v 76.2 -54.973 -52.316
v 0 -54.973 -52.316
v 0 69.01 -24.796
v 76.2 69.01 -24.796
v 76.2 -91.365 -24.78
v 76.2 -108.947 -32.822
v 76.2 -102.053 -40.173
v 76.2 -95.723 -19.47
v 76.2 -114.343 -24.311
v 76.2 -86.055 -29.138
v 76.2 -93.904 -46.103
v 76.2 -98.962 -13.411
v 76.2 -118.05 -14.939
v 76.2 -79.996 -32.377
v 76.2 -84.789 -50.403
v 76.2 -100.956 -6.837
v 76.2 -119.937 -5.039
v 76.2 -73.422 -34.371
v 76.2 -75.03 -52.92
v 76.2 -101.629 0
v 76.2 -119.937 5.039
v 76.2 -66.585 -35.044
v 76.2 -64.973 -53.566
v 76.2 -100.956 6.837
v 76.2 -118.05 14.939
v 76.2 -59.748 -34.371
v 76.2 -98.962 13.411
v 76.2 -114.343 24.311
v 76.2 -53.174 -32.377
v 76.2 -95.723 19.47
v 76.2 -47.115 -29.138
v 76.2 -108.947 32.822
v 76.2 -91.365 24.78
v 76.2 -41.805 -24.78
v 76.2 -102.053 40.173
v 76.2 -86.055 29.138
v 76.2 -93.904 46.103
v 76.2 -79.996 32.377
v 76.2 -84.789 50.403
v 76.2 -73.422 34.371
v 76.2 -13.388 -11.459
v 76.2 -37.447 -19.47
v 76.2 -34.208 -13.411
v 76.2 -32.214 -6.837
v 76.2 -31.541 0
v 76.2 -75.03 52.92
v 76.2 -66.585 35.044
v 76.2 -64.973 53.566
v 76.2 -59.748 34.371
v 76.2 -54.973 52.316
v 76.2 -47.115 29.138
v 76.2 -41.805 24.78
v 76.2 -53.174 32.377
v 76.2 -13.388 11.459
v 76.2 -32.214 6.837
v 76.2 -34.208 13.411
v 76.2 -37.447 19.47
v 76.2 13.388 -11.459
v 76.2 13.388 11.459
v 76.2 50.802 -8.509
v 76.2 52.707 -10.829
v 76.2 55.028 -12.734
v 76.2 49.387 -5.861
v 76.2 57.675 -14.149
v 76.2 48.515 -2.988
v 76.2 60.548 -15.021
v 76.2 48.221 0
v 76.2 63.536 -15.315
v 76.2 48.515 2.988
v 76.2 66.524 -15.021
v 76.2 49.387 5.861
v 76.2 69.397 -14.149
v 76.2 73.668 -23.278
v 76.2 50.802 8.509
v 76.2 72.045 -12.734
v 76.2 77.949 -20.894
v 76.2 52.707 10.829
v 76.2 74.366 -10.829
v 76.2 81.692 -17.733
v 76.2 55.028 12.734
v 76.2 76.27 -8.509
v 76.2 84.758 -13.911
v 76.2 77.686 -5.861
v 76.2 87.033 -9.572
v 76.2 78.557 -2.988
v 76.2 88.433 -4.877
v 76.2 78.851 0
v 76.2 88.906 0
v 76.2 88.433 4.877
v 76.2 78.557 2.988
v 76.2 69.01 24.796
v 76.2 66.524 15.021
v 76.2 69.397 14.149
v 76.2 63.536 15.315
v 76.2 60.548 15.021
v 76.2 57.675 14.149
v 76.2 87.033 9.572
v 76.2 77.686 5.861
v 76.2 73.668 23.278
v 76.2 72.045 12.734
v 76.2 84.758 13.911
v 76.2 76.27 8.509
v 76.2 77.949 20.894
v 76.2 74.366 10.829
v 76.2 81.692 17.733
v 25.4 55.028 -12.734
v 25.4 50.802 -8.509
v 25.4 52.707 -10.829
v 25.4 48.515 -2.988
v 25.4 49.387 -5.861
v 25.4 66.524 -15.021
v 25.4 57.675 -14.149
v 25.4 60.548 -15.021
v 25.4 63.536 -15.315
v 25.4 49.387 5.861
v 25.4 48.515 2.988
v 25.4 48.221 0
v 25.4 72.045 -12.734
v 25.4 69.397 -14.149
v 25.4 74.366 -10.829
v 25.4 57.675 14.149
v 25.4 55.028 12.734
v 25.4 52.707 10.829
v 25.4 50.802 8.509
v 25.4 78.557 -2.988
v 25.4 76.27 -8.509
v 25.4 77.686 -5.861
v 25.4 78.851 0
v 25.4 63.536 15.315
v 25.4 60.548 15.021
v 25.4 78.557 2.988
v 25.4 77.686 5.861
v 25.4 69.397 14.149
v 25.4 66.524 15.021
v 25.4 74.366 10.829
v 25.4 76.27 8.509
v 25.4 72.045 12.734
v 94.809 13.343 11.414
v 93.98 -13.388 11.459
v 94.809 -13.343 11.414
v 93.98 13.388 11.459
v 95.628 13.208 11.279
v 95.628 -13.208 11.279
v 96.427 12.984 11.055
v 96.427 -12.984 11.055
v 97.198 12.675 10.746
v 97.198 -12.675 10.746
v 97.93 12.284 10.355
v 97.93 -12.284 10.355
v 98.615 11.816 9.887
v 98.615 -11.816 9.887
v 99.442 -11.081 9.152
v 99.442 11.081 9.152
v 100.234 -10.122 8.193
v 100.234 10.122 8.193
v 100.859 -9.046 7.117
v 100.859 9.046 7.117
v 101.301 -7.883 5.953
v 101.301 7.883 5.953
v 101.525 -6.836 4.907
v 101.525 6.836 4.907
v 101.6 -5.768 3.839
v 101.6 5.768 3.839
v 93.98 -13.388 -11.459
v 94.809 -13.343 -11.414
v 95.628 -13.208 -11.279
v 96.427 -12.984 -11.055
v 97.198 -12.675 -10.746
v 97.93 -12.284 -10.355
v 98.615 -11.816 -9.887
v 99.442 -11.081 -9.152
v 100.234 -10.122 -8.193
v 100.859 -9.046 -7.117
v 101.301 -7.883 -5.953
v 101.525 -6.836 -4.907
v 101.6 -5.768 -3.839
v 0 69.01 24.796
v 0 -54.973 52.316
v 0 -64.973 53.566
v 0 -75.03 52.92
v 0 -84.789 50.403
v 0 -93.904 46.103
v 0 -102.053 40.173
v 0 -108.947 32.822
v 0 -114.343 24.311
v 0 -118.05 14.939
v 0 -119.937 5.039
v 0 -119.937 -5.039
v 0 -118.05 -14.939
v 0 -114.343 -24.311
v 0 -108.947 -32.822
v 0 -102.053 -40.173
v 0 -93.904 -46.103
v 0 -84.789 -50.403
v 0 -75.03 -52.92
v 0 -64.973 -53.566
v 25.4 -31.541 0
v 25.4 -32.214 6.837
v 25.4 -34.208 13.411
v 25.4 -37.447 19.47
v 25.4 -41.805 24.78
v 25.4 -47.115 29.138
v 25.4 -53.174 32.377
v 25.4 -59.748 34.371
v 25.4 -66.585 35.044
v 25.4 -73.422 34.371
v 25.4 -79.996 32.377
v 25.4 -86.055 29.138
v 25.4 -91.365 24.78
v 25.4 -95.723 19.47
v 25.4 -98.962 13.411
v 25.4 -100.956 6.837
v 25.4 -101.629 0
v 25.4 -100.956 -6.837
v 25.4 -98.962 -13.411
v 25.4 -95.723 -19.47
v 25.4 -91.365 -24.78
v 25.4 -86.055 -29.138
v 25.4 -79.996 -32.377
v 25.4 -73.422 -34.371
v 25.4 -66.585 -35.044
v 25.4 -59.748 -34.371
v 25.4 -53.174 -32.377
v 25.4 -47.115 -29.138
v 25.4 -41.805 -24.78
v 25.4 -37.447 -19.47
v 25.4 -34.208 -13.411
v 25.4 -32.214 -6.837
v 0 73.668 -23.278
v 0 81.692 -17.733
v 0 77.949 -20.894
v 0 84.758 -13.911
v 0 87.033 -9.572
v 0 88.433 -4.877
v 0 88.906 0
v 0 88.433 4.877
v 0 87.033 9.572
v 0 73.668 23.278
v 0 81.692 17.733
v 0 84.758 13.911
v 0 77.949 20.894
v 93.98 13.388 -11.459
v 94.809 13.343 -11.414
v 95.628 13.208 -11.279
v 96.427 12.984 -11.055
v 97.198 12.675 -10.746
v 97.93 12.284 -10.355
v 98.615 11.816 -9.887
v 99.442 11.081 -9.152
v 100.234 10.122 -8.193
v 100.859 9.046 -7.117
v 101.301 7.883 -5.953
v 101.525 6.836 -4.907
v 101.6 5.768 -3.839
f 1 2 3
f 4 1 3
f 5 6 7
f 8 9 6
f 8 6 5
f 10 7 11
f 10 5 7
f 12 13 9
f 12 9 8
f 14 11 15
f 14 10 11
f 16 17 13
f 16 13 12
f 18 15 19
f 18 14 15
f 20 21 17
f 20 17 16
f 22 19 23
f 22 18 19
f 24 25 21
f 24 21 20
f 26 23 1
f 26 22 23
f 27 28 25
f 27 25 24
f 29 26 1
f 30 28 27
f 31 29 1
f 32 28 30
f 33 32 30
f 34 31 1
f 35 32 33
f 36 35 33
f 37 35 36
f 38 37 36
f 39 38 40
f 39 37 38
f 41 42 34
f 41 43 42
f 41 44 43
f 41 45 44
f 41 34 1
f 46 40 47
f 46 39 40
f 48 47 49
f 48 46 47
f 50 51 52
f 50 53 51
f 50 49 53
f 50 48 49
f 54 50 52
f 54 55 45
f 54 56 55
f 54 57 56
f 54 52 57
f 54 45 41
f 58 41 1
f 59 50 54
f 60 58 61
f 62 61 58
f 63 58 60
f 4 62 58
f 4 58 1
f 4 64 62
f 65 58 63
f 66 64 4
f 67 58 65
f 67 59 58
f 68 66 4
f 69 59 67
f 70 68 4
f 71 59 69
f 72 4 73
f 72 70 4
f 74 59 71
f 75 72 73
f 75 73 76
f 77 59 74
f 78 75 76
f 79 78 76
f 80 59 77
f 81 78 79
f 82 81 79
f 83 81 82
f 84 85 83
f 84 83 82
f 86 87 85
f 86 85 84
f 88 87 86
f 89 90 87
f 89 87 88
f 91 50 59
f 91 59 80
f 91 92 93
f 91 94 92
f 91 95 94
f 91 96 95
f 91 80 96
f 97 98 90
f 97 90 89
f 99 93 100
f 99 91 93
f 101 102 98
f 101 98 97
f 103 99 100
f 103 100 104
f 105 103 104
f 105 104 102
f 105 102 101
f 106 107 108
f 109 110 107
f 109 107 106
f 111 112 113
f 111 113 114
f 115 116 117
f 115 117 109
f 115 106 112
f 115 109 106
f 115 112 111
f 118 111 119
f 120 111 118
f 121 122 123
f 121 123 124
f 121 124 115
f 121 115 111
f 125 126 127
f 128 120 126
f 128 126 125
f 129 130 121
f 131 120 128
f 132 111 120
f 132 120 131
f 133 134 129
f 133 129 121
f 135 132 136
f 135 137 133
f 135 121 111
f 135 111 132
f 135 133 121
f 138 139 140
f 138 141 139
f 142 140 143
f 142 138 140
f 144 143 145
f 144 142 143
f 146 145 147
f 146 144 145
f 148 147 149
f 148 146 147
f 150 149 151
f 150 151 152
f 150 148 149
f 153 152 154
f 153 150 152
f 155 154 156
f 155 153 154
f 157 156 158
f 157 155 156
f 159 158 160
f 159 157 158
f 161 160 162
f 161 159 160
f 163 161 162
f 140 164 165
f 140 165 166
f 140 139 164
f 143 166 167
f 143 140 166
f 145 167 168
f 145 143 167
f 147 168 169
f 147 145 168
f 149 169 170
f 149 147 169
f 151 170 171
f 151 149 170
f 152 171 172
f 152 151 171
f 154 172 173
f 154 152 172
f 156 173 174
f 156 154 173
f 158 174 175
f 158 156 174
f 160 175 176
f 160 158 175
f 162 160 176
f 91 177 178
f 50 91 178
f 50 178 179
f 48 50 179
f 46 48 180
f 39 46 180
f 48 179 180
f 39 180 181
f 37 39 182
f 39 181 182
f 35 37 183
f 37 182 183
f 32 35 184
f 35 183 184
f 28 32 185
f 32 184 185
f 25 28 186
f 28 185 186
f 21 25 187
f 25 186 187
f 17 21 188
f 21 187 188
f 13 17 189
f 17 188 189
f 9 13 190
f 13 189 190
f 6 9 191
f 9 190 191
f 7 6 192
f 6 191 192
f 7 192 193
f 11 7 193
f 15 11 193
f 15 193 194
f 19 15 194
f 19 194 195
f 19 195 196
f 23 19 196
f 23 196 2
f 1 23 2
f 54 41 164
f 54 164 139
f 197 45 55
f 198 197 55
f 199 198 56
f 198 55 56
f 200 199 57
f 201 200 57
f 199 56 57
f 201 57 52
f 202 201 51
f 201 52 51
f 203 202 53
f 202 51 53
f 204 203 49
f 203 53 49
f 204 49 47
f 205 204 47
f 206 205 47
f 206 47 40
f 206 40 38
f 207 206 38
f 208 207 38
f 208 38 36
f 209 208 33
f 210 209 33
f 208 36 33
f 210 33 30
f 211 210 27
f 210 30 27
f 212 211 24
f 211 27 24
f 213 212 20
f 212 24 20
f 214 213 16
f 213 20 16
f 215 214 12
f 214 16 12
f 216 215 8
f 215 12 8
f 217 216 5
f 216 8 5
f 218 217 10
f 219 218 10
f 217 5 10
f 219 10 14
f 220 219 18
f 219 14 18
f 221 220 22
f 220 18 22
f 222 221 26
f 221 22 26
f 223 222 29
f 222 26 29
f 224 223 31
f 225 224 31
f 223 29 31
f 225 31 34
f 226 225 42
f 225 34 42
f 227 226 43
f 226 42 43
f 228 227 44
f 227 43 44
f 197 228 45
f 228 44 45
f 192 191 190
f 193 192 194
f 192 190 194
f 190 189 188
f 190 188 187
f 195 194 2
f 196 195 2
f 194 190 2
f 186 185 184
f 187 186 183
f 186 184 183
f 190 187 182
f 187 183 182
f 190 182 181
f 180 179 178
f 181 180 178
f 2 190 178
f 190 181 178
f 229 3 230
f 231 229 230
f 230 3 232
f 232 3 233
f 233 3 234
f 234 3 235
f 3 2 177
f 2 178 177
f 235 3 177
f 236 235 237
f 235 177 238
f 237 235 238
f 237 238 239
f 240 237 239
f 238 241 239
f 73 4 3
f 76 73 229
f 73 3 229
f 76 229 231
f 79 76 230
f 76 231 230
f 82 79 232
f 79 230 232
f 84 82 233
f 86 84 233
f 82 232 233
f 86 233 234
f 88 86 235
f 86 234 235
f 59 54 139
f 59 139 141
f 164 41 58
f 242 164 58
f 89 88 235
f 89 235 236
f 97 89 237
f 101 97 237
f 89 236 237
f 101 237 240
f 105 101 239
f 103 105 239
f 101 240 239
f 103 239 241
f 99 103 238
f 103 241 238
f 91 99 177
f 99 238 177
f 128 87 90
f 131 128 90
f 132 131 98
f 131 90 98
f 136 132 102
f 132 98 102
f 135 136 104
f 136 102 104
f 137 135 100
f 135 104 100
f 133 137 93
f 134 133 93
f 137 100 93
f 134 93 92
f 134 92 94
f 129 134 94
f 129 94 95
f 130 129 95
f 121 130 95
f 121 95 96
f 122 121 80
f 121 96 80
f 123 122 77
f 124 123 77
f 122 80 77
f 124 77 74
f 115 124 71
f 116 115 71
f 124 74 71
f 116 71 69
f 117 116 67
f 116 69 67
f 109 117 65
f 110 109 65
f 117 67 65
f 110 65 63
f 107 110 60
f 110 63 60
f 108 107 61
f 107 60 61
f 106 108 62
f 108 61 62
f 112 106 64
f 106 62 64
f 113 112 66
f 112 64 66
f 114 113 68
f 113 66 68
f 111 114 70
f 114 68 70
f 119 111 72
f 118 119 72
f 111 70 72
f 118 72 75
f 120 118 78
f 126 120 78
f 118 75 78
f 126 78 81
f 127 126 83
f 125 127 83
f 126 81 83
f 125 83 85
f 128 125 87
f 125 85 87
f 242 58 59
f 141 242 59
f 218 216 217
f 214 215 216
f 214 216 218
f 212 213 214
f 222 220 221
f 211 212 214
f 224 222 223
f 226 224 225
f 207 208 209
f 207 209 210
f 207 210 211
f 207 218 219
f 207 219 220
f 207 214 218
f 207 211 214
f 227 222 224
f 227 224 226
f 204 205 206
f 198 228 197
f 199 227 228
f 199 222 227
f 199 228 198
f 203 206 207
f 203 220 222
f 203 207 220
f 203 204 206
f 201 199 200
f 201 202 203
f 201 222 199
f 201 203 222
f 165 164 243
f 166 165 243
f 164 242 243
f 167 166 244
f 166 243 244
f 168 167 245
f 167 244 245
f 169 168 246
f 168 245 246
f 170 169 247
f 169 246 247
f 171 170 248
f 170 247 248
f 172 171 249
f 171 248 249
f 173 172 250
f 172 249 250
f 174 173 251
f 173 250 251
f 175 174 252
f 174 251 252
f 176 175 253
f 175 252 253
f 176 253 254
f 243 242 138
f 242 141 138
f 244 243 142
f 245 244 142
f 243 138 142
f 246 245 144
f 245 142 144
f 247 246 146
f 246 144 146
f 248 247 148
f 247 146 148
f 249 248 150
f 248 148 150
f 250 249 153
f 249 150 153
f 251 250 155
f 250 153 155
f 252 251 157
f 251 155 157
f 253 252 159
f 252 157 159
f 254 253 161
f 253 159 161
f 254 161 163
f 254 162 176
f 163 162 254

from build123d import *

# Parameters (mm, degrees)
F1_DEPTH = 76.2
F2_R     = 35.044317
F3_DEPTH = 50.8
F4_R     = 15.315164
F5_DEPTH = 50.8
F6_W     = 26.776026
F6_H     = 22.917912
F7_DEPTH = 25.4
F8_R     = 7.62


with BuildPart() as f1:
    # F0 (on Right) → F1 (new body)
    with BuildSketch(Plane.YZ):
        with BuildLine():
            ThreePointArc((-54.972521, -52.316467), (-24.786857, -33.537675), (-12.995266, 0))
            ThreePointArc((-12.995266, 0), (-24.786857, 33.537675), (-54.972521, 52.316467))
            ThreePointArc((-54.972521, 52.316467), (-120.174799, 0), (-54.972521, -52.316467))
        make_face()
        with BuildLine():
            ThreePointArc((-54.972521, 52.316467), (-24.786857, 33.537675), (-12.995266, 0))
            ThreePointArc((-12.995266, 0), (-24.786857, -33.537675), (-54.972521, -52.316467))
            Line((-54.972521, -52.316467), (69.009942, -24.796493))
            ThreePointArc((69.009942, -24.796493), (38.105947, 0), (69.009942, 24.796493))
            Line((69.009942, 24.796493), (-54.972521, 52.316467))
        make_face()
        with BuildLine():
            ThreePointArc((88.905947, 0), (83.317074, 15.895888), (69.009942, 24.796493))
            ThreePointArc((69.009942, 24.796493), (38.105947, 0), (69.009942, -24.796493))
            ThreePointArc((69.009942, -24.796493), (83.317074, -15.895888), (88.905947, 0))
        make_face()
    extrude(amount=F1_DEPTH)

    # F2 (on face) → F3 (cut)
    with BuildSketch(Plane.YZ.offset(76.2)):
        with Locations((-66.585032, 0)):
            Circle(F2_R)
    extrude(amount=-F3_DEPTH, mode=Mode.SUBTRACT)

    # F4 (on face) → F5 (cut)
    with BuildSketch(Plane.YZ.offset(76.2)):
        with Locations((63.536301, 0)):
            Circle(F4_R)
    extrude(amount=-F5_DEPTH, mode=Mode.SUBTRACT)

    # F6 (on face) → F7 (join)
    with BuildSketch(Plane.YZ.offset(76.2)):
        Rectangle(F6_W, F6_H)
    extrude(amount=F7_DEPTH)

    # F8
    f8_edges = [f1.edges().sort_by_distance(p)[0] for p in [
        (101.6, -13.388013, 0),
        (101.6, 0, -11.458956),
        (101.6, 13.388013, 0),
        (101.6, 0, 11.458956),
    ]]
    fillet(f8_edges, radius=F8_R)


solid = f1.part
